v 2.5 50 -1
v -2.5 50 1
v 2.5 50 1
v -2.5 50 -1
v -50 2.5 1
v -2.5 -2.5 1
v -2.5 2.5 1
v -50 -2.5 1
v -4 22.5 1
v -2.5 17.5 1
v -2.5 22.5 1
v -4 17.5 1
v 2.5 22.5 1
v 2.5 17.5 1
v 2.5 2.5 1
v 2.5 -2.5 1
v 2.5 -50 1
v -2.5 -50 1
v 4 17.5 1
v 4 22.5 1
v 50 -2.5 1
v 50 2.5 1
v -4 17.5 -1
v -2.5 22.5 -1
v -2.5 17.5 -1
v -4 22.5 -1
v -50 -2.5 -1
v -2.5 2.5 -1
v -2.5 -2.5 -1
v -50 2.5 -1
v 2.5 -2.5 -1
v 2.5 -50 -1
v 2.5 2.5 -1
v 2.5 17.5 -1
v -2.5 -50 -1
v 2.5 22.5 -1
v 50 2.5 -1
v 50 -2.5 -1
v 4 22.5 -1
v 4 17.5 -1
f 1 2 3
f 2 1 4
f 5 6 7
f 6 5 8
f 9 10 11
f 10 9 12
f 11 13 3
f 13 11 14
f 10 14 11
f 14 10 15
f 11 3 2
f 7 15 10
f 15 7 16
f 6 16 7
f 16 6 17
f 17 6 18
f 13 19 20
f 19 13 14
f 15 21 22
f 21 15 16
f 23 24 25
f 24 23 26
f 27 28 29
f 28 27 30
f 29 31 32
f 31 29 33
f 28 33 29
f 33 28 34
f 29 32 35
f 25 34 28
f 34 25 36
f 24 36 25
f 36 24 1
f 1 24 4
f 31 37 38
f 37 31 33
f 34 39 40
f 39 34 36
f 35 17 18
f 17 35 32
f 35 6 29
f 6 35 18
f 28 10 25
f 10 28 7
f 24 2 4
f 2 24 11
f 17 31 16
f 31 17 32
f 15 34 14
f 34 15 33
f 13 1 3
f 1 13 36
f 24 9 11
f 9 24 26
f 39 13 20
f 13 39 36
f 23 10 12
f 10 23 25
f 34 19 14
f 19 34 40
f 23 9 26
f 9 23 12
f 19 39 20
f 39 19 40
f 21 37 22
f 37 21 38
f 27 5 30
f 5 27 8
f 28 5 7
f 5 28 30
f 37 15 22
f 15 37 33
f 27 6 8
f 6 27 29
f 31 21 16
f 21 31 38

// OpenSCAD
//X scale 100/101.5=0.9852 = 98.52%
//Y scale 100/99.3=1.007 = 100.7%

cube([100, 5, 2], center=true);
rotate([0, 0, 90]) {
  cube([100, 5, 2], center=true);
  translate([20, 0, 0]) {
    cube([5, 8, 2], center=true);
  }
}
translate([0, 0, 10+1]) {
//  cube([5, 5, 20], center=true);
}
